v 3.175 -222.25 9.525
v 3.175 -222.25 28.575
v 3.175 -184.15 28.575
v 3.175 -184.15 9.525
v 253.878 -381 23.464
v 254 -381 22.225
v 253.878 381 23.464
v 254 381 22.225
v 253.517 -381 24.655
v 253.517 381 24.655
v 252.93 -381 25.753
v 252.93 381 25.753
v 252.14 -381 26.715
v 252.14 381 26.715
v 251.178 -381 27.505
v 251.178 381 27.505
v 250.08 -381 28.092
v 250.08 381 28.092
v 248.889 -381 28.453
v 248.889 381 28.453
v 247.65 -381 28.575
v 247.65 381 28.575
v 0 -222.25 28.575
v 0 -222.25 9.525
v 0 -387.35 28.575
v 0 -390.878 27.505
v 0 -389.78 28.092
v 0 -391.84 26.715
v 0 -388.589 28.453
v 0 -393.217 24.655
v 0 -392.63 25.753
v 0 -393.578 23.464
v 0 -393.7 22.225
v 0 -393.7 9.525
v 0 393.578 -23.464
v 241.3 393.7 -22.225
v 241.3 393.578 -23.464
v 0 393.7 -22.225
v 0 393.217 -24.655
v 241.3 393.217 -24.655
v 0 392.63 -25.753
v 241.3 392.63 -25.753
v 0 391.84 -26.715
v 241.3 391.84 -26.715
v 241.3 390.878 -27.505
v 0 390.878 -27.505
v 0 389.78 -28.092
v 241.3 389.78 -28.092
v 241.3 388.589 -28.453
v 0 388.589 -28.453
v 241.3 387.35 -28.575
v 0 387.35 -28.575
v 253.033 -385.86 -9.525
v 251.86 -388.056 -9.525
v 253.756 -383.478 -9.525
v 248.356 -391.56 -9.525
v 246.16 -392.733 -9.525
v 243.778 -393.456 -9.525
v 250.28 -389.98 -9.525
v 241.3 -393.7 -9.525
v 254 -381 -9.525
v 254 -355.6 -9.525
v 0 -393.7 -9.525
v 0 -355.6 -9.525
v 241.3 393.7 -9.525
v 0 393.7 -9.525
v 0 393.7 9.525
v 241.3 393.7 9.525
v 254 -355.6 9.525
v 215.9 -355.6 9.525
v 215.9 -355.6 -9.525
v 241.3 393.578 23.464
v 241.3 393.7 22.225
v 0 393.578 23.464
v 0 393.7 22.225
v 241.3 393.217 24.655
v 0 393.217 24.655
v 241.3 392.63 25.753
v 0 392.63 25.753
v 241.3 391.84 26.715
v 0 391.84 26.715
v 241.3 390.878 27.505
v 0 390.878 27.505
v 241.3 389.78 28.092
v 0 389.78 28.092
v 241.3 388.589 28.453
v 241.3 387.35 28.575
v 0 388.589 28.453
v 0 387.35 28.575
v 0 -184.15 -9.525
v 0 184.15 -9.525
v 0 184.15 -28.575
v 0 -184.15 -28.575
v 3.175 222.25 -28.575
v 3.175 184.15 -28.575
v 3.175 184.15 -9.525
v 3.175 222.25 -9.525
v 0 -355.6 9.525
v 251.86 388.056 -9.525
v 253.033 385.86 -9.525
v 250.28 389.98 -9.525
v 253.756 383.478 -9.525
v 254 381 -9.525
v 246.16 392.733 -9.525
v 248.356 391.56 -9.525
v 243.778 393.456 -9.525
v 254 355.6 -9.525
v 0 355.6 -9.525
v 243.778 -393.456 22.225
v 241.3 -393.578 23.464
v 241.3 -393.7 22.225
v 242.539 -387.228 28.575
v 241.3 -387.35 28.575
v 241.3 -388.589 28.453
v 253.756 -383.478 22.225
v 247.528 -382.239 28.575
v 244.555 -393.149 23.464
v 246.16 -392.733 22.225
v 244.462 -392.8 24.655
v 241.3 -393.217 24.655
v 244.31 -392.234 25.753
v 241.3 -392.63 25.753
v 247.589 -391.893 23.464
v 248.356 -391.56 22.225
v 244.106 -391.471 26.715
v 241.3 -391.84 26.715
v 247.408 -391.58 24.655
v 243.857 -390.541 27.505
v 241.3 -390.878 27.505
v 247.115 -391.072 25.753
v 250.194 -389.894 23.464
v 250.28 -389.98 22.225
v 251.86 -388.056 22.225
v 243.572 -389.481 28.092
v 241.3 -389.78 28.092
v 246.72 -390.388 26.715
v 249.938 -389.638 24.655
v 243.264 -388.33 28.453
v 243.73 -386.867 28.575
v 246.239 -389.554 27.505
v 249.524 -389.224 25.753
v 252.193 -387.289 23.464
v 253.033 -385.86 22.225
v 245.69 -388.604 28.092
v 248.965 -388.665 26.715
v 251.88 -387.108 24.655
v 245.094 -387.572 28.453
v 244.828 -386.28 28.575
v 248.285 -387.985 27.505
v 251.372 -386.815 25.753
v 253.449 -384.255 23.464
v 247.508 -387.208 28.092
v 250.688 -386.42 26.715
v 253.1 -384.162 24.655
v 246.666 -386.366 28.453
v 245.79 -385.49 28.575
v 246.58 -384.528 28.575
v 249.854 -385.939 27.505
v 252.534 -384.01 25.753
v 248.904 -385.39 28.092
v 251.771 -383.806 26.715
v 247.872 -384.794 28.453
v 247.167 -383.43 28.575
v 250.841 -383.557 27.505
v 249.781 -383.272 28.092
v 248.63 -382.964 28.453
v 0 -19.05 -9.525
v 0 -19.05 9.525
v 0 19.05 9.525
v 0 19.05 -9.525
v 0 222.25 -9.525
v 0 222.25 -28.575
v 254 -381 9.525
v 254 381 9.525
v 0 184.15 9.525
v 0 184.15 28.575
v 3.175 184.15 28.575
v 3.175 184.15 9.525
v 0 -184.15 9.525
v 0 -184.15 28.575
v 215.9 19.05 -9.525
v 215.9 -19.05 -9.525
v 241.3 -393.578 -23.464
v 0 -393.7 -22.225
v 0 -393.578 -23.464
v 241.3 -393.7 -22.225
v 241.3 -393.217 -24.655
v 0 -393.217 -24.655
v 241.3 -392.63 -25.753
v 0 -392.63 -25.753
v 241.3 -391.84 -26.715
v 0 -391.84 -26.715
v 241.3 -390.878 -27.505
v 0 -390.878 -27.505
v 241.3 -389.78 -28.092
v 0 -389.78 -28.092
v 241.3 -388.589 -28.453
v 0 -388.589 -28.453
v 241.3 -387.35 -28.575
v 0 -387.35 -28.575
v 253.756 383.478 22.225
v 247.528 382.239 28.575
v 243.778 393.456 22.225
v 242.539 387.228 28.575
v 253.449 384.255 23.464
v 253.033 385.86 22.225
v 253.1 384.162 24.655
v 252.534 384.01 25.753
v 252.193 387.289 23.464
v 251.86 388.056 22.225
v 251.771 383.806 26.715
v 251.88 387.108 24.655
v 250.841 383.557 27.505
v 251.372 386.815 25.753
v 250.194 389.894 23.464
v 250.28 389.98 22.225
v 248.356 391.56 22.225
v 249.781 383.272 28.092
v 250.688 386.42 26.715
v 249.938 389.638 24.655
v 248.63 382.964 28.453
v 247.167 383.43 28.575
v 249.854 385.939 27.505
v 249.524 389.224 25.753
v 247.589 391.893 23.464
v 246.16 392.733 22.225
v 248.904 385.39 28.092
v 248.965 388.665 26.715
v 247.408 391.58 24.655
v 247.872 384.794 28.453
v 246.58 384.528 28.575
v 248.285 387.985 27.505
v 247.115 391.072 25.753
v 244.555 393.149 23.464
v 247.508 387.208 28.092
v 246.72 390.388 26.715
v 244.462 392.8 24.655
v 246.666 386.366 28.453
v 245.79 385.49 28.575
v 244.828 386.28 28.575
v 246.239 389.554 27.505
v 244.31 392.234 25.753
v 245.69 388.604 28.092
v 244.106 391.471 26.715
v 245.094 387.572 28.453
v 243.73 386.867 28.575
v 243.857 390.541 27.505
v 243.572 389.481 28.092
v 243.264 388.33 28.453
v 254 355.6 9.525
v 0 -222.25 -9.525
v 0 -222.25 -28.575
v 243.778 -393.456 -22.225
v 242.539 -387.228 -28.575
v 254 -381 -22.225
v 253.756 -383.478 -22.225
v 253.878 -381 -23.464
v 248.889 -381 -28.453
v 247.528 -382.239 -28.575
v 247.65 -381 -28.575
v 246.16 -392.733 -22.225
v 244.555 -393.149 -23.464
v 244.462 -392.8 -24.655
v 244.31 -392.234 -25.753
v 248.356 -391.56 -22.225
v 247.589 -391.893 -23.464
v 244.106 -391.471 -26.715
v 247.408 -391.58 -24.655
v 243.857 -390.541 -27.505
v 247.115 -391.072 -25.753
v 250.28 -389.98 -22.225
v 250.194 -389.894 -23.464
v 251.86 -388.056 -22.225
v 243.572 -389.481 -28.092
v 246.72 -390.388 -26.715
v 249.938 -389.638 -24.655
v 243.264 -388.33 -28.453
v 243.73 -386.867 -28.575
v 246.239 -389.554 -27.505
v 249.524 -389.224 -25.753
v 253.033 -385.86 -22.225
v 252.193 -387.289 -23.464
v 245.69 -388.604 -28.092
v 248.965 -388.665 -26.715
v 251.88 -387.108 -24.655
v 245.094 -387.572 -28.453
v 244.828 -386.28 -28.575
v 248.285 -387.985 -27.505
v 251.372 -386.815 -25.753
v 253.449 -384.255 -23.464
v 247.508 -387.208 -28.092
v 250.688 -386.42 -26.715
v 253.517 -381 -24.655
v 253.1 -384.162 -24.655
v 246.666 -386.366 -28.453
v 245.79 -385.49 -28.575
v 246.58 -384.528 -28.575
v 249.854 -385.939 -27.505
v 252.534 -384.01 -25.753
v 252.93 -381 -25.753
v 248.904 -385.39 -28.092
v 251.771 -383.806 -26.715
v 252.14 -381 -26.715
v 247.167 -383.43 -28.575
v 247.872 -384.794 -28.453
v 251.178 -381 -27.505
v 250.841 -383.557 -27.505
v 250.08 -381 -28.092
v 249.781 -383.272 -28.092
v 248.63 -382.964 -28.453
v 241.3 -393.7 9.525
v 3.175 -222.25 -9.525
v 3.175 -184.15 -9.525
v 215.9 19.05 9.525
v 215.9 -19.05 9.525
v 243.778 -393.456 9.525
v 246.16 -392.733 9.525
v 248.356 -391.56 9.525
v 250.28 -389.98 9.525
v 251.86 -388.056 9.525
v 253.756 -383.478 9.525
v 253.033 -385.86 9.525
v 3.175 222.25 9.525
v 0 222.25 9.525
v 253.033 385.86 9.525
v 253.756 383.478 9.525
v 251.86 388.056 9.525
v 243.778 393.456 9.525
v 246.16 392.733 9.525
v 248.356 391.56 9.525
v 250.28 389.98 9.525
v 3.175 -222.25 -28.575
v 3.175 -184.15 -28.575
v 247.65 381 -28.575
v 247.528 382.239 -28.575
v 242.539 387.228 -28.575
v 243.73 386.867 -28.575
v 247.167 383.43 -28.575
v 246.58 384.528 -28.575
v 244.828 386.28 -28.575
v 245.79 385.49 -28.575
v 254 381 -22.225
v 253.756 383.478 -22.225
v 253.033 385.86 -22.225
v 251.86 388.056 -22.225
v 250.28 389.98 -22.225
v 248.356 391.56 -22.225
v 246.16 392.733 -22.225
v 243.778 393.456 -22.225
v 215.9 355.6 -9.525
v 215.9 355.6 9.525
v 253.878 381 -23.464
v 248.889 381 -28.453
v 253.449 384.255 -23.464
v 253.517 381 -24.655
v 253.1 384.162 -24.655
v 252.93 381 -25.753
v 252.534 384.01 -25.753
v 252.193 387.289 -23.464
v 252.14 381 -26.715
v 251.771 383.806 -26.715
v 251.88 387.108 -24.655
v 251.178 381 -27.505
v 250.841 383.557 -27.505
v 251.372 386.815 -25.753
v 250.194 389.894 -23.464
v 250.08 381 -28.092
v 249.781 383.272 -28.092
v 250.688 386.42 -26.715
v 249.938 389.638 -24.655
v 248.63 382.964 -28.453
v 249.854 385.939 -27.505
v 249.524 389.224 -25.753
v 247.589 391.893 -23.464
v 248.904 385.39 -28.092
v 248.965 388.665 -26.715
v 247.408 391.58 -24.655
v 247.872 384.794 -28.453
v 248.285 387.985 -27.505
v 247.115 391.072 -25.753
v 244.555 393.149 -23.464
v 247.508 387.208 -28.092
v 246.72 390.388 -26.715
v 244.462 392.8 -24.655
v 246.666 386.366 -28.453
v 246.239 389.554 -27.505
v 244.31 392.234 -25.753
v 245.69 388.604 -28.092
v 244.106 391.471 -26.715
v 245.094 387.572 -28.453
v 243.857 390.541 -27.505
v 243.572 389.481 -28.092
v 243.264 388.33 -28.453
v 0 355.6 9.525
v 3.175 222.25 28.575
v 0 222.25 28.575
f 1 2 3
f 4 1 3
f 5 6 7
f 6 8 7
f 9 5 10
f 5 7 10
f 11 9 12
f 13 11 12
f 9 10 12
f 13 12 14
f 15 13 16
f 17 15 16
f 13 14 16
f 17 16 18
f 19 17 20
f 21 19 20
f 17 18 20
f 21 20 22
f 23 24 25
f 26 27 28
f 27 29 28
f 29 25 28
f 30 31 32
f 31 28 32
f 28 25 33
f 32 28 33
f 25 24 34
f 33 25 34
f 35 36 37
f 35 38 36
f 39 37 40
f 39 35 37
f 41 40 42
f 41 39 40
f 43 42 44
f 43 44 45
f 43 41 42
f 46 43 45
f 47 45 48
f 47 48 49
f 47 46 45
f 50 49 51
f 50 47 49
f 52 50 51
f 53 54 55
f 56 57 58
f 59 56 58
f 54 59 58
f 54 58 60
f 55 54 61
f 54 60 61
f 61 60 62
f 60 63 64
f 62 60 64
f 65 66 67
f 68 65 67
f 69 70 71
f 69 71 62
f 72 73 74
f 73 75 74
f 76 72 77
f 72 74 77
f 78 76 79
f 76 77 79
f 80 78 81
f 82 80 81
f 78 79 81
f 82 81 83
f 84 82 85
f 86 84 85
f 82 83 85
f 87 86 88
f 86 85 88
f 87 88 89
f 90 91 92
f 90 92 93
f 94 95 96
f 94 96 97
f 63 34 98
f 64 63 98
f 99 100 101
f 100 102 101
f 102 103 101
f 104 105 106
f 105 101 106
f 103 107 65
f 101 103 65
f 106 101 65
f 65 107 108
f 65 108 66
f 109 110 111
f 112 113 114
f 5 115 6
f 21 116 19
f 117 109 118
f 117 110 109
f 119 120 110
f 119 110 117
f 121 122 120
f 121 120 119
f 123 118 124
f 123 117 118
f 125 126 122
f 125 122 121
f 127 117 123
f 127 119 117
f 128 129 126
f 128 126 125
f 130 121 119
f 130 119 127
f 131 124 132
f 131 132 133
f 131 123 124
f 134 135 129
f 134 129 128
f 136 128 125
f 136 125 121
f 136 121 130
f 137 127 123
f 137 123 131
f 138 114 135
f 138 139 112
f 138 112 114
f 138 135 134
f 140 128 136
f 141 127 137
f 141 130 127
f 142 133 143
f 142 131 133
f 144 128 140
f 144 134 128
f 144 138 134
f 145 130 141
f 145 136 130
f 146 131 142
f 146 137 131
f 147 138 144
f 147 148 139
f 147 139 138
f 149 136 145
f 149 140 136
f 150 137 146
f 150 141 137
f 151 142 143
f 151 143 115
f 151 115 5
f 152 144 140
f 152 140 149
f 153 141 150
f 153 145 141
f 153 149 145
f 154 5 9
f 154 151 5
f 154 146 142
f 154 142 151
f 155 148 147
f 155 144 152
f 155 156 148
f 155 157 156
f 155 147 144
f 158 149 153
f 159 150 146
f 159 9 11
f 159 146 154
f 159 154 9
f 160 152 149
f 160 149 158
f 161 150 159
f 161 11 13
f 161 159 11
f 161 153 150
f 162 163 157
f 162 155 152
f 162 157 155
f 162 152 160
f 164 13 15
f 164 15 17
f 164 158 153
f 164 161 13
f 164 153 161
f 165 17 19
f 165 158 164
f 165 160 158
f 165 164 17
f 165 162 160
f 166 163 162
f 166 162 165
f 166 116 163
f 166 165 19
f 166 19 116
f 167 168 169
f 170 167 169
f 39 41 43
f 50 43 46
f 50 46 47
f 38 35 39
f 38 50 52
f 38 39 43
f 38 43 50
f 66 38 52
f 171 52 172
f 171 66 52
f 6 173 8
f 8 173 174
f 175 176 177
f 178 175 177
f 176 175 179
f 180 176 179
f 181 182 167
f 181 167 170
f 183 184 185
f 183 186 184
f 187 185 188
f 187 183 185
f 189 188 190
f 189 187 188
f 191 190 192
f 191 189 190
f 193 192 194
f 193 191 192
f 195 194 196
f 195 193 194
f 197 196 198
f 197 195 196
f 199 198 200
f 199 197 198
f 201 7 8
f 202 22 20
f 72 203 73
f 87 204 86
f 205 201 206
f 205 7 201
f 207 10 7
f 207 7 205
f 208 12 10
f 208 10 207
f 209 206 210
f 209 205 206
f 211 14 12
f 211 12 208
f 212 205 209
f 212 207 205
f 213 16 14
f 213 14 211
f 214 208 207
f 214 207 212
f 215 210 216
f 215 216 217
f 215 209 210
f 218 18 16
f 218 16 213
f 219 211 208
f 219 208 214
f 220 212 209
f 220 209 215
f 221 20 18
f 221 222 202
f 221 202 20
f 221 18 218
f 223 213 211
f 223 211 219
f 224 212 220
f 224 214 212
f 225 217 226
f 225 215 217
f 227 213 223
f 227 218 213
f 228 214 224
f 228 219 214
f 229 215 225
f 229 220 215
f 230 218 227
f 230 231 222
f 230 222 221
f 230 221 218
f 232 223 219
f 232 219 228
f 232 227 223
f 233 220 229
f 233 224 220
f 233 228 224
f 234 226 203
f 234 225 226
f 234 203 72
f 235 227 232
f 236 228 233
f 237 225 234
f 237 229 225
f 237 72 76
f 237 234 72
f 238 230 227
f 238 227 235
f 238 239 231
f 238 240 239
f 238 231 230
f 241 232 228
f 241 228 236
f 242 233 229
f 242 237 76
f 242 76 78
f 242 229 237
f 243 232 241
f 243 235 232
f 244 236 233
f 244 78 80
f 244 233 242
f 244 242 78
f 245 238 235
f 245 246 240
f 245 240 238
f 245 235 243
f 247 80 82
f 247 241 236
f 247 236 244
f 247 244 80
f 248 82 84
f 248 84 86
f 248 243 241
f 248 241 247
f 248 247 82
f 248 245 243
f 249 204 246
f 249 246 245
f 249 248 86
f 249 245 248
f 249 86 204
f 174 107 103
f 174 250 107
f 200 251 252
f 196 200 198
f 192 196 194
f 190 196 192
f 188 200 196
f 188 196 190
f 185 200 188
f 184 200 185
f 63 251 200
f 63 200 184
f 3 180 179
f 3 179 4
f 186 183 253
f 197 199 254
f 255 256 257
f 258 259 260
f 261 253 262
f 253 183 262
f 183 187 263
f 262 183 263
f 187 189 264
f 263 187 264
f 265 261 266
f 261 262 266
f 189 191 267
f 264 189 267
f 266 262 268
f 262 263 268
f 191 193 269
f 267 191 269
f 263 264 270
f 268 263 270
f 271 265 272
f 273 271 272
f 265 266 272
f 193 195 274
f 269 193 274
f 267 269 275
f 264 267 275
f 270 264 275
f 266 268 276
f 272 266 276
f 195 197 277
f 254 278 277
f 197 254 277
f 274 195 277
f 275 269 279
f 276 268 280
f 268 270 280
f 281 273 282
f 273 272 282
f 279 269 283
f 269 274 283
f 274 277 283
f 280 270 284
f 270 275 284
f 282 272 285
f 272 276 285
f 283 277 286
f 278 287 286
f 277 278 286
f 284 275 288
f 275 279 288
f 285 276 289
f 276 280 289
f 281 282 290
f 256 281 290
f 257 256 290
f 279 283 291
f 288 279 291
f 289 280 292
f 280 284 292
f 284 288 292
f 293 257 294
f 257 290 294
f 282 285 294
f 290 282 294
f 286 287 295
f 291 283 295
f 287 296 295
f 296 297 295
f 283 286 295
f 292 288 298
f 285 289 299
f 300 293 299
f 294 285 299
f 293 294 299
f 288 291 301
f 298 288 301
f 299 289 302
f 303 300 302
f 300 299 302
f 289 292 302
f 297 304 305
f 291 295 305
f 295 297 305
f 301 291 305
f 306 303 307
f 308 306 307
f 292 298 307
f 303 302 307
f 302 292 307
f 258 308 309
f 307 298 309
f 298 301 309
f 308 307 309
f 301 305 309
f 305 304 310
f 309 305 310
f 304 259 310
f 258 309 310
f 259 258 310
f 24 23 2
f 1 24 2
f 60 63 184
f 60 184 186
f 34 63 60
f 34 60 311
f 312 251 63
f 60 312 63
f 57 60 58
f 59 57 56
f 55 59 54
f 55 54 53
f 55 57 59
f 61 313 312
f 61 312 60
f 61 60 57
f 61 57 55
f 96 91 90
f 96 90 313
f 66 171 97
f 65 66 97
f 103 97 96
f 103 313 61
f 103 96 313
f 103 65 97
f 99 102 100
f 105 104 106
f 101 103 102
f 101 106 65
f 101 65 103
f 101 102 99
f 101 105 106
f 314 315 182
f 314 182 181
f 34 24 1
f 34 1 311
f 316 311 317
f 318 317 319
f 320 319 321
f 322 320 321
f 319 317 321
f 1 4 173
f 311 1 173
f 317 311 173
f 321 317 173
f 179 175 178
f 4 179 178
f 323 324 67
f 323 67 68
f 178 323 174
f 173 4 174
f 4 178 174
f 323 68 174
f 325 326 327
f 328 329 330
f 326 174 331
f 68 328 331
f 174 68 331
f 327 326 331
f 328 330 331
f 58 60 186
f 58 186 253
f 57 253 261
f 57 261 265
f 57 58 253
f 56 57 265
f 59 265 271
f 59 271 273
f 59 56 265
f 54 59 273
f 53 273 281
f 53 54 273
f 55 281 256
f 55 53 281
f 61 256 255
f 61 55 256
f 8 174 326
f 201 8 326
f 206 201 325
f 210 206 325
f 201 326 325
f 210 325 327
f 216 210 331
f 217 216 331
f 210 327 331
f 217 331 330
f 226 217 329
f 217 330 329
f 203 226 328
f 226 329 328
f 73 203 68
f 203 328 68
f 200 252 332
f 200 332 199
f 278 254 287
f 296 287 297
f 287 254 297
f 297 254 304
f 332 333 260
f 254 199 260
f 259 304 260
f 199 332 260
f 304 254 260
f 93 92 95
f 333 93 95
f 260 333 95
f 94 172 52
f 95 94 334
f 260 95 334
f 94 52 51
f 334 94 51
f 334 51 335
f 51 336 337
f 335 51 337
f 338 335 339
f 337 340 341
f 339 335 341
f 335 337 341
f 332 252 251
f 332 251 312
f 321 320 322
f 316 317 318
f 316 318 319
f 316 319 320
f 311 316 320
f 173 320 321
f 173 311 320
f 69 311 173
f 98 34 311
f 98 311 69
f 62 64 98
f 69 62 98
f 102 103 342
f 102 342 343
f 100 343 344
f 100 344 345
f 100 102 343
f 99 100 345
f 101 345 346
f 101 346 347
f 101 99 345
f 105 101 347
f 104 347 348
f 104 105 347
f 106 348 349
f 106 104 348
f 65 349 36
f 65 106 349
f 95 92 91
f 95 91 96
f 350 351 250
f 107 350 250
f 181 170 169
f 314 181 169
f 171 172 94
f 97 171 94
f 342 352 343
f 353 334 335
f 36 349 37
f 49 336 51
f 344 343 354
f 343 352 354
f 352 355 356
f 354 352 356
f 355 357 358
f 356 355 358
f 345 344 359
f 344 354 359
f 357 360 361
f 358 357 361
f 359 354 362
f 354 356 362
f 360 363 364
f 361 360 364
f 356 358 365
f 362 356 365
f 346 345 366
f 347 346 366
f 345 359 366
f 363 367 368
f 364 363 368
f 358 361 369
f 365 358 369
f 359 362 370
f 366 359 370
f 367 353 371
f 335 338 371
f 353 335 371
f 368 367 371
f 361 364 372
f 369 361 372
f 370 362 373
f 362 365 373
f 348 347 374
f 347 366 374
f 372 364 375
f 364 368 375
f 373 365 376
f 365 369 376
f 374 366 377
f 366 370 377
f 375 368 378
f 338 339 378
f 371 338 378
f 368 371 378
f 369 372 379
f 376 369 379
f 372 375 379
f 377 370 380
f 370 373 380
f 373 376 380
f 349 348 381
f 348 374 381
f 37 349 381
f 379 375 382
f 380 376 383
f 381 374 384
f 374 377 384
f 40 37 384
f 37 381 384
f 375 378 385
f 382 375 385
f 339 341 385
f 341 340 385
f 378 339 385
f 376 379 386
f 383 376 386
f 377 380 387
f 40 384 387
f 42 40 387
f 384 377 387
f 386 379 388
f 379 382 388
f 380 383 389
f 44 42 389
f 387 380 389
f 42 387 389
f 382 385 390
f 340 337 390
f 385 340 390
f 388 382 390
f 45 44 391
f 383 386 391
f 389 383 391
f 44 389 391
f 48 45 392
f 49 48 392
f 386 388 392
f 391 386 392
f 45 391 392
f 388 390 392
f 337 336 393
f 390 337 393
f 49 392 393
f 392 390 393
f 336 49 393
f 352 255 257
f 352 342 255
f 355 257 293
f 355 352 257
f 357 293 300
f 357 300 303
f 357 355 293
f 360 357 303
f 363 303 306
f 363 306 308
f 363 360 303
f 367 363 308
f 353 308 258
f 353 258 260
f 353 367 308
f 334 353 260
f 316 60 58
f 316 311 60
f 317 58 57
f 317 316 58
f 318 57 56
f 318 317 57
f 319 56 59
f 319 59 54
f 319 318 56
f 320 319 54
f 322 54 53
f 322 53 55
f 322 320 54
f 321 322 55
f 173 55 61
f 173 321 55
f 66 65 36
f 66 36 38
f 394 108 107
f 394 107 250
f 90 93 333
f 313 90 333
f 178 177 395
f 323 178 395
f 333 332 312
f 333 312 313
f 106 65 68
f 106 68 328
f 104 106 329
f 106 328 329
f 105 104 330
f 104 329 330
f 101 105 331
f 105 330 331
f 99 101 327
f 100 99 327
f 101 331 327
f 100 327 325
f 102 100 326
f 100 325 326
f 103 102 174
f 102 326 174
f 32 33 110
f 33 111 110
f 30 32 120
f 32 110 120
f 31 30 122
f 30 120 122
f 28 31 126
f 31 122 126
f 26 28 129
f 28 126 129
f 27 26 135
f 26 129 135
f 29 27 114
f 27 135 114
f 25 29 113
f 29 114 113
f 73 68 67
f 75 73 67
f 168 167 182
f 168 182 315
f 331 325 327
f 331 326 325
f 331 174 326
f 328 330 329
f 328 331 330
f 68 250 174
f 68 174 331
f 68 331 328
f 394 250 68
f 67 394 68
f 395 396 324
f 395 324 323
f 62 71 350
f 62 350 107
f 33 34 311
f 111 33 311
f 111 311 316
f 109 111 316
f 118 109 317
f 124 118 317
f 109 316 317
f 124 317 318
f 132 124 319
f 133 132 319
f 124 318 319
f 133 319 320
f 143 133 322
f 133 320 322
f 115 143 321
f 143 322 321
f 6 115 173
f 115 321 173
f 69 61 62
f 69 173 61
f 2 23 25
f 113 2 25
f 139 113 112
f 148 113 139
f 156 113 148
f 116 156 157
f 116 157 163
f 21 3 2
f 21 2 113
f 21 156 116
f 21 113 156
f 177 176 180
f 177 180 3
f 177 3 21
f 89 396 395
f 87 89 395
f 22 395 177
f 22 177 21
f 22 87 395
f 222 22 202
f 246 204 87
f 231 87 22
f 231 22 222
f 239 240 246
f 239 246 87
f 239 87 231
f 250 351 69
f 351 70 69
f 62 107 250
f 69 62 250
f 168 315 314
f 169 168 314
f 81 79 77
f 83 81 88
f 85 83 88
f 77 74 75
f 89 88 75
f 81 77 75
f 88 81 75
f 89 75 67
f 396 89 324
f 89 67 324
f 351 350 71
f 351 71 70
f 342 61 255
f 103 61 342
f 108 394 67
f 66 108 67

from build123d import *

# Parameters (mm, degrees)
F0_W      = 38.1
F0_H      = 19.05
F1_DEPTH  = 254
F2_W      = 38.1
F2_H      = 19.05
F3_DEPTH  = 355.6
F4_DEPTH  = 215.9
F5_R      = 12.7
F5_2_R    = 12.7
F6_W      = 38.1
F6_H      = 711.2
F7_DEPTH  = 19.05
F9_R      = 6.35
F8_W      = 3.175
F8_H      = 38.1
F11_DEPTH = 57.1510001


with BuildPart() as f1:
    # F0 (on Right) → F1 (new body)
    with BuildSketch(Plane.YZ):
        with Locations((-374.65, 0)):
            Rectangle(F0_W, F0_H)
    extrude(amount=F1_DEPTH)

    # F5
    f5_edges = [f1.edges().sort_by_distance(p)[0] for p in [
        (254, -393.7, 0),
    ]]
    fillet(f5_edges, radius=F5_R)


with BuildPart() as f1b:
    # F0 (on Right) → F1, piece 2 (new body)
    with BuildSketch(Plane.YZ):
        with Locations((374.65, 0)):
            Rectangle(F0_W, F0_H)
    extrude(amount=F1_DEPTH)

    # F5#2
    f5_2_edges = [f1b.edges().sort_by_distance(p)[0] for p in [
        (254, 393.7, 0),
    ]]
    fillet(f5_2_edges, radius=F5_2_R)


with BuildPart() as f3:
    # F2 (on Front) → F3 (new body, symmetric)
    with BuildSketch(Plane.XZ):
        with Locations((234.95, 0)):
            Rectangle(F2_W, F2_H)
    extrude(amount=F3_DEPTH, both=True)


with BuildPart() as f4:
    # F0 (on Right) → F4 (new body, through all)
    with BuildSketch(Plane.YZ):
        Rectangle(F0_W, F0_H)
    extrude(amount=F4_DEPTH)


with BuildPart() as f7:
    # F6 (on face) → F7 (new body)
    with BuildSketch(Plane.XY.offset(9.525)):
        with Locations((234.95, 0)):
            Rectangle(F6_W, F6_H)
        with BuildLine():
            Line((0, 393.7), (0, 355.6))
            Line((0, 355.6), (215.9, 355.6))
            Line((215.9, 355.6), (254, 355.6))
            Line((254, 355.6), (254, 381))
            ThreePointArc((254, 381), (250.2802561211, 389.9802561211), (241.3, 393.7))
            Line((241.3, 393.7), (0, 393.7))
        make_face()
        with BuildLine():
            Line((0, -393.7), (241.3, -393.7))
            ThreePointArc((241.3, -393.7), (250.2802561211, -389.9802561211), (254, -381))
            Line((254, -381), (254, -355.6))
            Line((254, -355.6), (215.9, -355.6))
            Line((215.9, -355.6), (215.9, 355.6))
            Line((215.9, 355.6), (0, 355.6))
            Line((0, 355.6), (0, -393.7))
        make_face()
    extrude(amount=F7_DEPTH)

    # F9
    f9_edges = [f7.edges().sort_by_distance(p)[0] for p in [
        (120.65, -393.7, 28.575),
    ]]
    fillet(f9_edges, radius=F9_R)


with BuildPart() as f10_1:
    # F10: instance of F7
    add(f7.part.mirror(Plane.XY))


with BuildPart() as f11_tool:
    # F8 (on face) → F11 (new body, through all)
    with BuildSketch(Plane.XY.offset(28.575)):
        with Locations((1.5875, -203.2)):
            Rectangle(F8_W, F8_H)
        with Locations((1.5875, 203.2)):
            Rectangle(F8_W, F8_H)
    extrude(amount=-F11_DEPTH)


with BuildPart() as f7_1:
    add(f7.part)

    # F11: cut by f11_tool
    add(f11_tool.part, mode=Mode.SUBTRACT)


with BuildPart() as f10_1_1:
    add(f10_1.part)

    # F11: cut by f11_tool
    add(f11_tool.part, mode=Mode.SUBTRACT)


with BuildPart() as f13_1:
    # F13: instance of F7
    add(f7_1.part.mirror(Plane.XY))


solid = Compound([f1.part, f1b.part, f3.part, f4.part, f7_1.part, f13_1.part])
